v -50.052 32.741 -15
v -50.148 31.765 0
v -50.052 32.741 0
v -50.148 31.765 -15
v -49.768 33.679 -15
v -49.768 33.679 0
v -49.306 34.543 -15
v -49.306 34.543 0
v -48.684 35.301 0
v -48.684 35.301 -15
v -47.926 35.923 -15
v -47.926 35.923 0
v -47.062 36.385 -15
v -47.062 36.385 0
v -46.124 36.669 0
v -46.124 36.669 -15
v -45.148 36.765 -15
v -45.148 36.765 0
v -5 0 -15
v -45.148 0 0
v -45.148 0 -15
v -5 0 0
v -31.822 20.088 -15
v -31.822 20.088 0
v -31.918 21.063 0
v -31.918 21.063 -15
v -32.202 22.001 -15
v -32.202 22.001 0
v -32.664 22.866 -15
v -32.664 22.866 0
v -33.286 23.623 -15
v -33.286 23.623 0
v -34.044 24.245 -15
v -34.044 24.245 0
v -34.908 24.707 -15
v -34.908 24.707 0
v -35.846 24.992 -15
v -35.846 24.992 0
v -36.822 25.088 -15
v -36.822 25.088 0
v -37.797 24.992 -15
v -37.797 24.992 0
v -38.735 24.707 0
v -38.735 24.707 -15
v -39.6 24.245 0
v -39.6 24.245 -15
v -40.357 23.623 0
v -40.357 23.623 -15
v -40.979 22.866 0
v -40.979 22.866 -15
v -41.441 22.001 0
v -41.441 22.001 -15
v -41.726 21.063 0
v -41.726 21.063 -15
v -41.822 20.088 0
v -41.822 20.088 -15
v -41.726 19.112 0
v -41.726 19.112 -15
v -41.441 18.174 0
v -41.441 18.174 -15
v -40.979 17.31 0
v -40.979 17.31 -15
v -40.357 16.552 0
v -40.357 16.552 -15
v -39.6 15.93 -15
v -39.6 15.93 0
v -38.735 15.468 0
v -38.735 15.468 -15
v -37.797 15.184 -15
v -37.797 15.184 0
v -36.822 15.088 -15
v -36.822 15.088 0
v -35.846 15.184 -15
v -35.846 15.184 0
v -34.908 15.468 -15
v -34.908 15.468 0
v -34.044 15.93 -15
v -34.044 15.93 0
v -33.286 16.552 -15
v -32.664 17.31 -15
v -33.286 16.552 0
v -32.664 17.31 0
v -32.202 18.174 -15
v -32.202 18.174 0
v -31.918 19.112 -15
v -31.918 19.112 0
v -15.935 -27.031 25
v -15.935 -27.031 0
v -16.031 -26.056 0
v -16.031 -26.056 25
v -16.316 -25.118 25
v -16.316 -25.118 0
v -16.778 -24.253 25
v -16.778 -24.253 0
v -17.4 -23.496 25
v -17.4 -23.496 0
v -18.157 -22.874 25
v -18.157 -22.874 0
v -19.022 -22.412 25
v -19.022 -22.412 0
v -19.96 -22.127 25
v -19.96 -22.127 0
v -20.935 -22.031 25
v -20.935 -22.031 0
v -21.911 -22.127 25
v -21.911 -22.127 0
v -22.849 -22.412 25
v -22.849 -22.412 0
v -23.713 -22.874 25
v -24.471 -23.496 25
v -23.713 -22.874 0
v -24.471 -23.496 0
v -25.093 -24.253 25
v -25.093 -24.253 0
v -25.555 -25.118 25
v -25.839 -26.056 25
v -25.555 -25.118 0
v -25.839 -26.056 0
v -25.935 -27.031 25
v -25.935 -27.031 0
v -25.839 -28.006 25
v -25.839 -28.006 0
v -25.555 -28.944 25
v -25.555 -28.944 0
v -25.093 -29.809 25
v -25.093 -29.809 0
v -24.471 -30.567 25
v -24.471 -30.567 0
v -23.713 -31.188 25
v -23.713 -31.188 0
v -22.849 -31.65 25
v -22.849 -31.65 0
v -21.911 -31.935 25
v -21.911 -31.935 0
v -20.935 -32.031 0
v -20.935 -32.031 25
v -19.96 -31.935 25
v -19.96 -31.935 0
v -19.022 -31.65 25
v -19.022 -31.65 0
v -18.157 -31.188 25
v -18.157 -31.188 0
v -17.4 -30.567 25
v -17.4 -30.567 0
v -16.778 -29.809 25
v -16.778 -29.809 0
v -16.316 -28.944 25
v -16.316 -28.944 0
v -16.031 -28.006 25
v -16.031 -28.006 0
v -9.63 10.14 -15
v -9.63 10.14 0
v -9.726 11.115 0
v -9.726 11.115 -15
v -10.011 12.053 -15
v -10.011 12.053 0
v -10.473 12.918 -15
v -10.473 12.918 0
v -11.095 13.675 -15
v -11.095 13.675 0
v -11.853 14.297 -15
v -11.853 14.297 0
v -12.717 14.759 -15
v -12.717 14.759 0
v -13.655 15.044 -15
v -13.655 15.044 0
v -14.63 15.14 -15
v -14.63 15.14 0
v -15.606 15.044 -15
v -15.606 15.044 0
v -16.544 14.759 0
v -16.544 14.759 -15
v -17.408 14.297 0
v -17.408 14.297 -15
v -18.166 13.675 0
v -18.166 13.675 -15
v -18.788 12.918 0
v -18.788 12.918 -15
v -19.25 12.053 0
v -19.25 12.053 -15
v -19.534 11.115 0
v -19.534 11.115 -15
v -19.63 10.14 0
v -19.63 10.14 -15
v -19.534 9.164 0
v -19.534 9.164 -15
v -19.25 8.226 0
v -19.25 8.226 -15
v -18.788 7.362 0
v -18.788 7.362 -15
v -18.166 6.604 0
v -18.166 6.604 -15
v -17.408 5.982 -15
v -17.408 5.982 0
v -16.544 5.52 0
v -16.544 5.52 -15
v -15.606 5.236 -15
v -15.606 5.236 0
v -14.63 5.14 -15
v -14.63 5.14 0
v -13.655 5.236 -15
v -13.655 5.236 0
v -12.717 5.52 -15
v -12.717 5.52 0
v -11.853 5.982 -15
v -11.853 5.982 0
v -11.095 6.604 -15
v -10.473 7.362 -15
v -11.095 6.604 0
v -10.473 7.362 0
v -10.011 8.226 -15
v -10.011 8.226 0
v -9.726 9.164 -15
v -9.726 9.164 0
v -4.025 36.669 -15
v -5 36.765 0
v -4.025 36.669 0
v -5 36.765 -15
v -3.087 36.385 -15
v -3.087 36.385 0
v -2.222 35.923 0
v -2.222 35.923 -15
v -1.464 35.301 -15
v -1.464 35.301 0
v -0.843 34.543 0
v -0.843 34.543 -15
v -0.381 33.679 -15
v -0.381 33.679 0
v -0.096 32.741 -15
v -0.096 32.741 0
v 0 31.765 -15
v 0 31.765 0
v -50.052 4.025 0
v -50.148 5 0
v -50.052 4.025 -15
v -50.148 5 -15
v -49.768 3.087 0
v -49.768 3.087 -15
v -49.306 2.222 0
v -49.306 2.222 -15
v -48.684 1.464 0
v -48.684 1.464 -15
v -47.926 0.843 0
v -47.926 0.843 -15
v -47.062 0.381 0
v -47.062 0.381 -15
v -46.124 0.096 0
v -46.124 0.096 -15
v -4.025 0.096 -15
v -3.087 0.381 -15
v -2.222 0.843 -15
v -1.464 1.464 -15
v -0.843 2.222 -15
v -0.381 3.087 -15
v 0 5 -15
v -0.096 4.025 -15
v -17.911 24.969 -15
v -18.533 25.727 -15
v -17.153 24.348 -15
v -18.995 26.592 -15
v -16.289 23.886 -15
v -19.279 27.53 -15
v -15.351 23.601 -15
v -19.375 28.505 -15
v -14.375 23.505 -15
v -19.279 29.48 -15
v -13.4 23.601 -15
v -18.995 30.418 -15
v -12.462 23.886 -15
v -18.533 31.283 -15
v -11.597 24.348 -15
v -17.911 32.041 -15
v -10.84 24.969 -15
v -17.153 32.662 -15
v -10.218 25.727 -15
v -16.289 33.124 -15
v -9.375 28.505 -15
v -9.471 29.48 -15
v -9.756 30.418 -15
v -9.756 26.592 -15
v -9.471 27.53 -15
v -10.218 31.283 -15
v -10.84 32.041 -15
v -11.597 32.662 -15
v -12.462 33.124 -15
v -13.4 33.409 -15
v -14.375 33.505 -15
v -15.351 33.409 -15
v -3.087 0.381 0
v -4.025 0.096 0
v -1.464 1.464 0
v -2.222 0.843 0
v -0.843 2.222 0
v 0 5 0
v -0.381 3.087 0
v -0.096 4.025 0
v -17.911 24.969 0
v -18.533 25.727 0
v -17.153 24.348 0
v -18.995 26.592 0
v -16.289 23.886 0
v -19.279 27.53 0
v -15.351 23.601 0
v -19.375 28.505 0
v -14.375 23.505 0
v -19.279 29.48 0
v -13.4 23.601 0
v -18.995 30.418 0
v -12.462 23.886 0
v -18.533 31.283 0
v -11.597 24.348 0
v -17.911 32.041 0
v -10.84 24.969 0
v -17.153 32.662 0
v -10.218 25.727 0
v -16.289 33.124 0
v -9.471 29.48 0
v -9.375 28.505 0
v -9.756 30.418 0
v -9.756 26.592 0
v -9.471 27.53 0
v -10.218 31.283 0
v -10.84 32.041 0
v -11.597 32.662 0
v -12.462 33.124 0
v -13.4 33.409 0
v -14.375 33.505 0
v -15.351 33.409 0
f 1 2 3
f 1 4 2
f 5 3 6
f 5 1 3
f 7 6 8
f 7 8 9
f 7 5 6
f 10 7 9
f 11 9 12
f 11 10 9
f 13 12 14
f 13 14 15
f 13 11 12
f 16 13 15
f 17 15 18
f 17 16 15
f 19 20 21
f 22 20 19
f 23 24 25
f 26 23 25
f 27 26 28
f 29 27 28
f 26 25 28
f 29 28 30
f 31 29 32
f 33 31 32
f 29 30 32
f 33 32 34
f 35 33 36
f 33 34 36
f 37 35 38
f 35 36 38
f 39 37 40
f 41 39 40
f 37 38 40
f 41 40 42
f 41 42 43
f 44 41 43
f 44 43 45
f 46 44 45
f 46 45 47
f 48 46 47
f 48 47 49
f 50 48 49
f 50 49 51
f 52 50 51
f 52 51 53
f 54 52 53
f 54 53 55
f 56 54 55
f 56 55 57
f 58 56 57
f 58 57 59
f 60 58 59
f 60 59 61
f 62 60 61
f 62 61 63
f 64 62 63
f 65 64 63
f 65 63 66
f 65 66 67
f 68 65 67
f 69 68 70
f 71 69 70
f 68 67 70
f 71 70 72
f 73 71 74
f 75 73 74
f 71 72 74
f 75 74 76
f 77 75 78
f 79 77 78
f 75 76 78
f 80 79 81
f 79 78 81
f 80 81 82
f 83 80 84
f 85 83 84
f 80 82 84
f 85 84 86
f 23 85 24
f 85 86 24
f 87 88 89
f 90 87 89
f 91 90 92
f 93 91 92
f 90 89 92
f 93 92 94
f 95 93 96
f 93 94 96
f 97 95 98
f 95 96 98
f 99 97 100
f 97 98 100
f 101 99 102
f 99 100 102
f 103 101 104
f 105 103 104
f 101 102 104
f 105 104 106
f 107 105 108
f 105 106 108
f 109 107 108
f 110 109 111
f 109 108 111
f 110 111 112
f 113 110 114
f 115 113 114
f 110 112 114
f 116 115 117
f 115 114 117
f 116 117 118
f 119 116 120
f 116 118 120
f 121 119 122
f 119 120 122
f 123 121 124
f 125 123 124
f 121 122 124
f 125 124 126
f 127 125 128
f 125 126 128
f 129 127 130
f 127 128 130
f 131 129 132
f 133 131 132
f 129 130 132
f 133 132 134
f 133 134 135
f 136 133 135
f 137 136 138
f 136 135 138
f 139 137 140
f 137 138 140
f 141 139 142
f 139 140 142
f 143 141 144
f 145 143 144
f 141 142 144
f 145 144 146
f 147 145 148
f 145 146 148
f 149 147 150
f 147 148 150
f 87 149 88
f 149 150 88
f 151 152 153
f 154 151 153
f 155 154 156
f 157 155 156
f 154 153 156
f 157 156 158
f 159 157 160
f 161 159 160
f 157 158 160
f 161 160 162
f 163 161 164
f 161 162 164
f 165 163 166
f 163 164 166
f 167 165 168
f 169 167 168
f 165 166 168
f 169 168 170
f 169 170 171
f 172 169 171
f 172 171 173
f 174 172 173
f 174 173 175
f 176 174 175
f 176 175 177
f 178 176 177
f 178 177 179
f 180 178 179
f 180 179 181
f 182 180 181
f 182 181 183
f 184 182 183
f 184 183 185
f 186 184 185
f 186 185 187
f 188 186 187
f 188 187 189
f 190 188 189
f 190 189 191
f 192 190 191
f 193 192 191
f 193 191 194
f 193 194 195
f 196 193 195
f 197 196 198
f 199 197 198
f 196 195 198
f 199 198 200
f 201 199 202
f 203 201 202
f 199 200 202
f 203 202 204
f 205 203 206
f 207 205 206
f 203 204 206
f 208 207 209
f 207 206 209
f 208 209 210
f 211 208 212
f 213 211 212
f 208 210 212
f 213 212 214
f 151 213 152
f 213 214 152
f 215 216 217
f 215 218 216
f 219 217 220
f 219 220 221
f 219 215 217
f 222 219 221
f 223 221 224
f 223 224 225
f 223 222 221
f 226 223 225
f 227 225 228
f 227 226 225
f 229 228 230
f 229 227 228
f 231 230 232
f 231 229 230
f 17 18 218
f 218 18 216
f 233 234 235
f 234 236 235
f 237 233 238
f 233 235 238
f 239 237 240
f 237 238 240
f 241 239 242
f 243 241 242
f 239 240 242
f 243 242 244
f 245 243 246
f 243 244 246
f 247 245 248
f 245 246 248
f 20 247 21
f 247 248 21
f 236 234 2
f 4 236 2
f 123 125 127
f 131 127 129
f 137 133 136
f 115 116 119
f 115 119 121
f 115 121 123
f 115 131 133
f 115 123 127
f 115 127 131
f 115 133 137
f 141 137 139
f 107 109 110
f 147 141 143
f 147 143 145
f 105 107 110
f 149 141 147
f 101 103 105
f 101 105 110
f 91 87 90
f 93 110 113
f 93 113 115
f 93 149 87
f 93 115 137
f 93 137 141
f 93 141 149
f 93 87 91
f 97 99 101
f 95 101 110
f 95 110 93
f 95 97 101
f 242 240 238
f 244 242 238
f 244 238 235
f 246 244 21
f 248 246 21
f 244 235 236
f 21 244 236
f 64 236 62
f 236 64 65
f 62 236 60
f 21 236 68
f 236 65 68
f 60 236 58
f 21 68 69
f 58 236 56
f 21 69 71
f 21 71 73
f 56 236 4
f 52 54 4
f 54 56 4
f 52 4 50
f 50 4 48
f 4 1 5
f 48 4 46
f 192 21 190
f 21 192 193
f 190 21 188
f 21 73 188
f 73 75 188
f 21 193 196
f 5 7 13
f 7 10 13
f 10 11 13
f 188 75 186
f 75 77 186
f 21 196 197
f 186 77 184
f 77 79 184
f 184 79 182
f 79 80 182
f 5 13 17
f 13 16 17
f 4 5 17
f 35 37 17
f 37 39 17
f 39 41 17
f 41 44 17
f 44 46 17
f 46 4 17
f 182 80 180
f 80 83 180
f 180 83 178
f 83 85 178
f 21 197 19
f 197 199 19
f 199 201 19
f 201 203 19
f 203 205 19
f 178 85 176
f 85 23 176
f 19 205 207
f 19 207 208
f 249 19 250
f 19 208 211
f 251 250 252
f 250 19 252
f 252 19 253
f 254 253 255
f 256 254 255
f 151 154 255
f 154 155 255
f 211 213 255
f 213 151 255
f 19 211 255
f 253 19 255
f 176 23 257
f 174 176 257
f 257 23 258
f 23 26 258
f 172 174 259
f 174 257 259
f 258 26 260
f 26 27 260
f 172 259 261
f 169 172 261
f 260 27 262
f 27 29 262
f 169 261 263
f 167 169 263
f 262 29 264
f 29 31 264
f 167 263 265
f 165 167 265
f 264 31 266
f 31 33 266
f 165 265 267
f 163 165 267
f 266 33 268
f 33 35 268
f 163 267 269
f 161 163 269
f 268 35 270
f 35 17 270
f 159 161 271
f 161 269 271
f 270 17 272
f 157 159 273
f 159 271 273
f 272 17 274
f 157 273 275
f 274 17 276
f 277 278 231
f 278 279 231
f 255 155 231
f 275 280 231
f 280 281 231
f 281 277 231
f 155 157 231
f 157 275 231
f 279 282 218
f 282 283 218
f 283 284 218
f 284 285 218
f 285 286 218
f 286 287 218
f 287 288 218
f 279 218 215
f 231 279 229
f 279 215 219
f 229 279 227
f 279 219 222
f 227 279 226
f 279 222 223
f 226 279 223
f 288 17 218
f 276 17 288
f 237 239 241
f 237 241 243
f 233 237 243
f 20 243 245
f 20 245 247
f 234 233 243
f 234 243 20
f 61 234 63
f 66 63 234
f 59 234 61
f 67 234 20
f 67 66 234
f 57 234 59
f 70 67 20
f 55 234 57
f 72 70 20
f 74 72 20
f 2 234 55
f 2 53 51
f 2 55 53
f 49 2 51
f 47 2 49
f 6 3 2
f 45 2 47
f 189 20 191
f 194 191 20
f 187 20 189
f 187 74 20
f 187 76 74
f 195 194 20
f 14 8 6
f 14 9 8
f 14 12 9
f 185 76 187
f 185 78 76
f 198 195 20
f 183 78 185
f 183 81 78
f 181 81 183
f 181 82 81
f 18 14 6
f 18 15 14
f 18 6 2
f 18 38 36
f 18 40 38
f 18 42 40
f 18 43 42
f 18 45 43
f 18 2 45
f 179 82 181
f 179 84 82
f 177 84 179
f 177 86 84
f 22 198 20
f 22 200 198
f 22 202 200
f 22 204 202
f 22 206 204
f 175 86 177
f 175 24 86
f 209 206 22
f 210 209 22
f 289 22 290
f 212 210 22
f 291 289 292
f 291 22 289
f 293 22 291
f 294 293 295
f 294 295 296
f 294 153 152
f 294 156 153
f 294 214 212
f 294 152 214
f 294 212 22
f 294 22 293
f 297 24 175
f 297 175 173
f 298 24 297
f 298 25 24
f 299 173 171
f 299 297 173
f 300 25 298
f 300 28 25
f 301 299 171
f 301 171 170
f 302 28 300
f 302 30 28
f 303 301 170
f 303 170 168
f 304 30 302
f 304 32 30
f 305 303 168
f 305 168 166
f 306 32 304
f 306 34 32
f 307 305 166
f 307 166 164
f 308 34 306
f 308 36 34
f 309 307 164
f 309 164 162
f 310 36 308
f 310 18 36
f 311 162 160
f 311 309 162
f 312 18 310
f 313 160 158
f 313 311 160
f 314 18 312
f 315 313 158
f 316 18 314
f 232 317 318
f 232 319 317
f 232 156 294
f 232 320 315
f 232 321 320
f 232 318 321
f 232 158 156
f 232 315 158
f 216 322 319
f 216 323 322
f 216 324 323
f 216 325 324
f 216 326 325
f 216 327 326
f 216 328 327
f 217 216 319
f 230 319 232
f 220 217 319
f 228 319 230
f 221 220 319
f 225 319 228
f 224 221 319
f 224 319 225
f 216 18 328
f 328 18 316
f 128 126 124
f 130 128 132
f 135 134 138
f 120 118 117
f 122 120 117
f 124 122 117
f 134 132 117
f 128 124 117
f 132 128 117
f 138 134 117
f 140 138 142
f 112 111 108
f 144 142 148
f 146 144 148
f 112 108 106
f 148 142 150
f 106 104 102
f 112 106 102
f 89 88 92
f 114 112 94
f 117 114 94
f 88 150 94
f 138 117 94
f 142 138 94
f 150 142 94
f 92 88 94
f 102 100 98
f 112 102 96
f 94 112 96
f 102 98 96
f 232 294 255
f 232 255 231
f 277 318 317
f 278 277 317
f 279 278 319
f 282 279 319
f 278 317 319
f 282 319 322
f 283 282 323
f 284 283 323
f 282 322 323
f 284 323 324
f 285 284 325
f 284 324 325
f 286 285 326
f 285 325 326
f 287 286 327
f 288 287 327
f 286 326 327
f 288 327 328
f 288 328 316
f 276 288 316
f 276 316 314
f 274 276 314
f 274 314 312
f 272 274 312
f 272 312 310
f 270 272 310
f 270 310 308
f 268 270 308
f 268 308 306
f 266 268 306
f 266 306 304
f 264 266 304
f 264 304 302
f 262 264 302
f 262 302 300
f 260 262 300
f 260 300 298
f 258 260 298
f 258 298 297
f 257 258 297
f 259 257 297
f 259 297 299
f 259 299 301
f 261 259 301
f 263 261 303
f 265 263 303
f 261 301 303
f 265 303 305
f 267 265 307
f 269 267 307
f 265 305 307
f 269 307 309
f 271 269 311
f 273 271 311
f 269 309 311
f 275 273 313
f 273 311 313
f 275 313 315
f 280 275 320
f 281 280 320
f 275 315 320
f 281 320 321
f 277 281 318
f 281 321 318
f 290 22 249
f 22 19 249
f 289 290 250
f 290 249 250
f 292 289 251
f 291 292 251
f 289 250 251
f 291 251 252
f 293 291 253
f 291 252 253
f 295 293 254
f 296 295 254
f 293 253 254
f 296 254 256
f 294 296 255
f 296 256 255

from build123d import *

# Parameters (mm, degrees)
F0_W     = 50.148401
F0_H     = 36.765244
F1_DEPTH = 15
F2_R     = 5
F3_DEPTH = 25
F4_R     = 5
F5_R     = 5
F6_DEPTH = 25


with BuildPart() as f1:
    # F0 (on Top) → F1 (new body)
    with BuildSketch(Plane.XY):
        with Locations((-25.0742, 18.382622)):
            Rectangle(F0_W, F0_H)
    extrude(amount=-F1_DEPTH)

    # F2 (on face) → F3 (cut)
    with BuildSketch(Plane.XY):
        with Locations((-14.375314, 28.505028)):
            Circle(F2_R)
        with Locations((-14.630386, 10.13984)):
            Circle(F2_R)
        with Locations((-36.821657, 20.08765)):
            Circle(F2_R)
    extrude(amount=-F3_DEPTH, mode=Mode.SUBTRACT)

    # F4
    f4_edges = [f1.edges().sort_by_distance(p)[0] for p in [
        (-50.148401, 0, -7.5),
        (0, 0, -7.5),
        (0, 36.765244, -7.5),
        (-50.148401, 36.765244, -7.5),
    ]]
    fillet(f4_edges, radius=F4_R)


with BuildPart() as f6:
    # F5 (on Top) → F6 (new body)
    with BuildSketch(Plane.XY):
        with Locations((-20.935191, -27.031036)):
            Circle(F5_R)
    extrude(amount=F6_DEPTH)


solid = Compound([f1.part, f6.part])
